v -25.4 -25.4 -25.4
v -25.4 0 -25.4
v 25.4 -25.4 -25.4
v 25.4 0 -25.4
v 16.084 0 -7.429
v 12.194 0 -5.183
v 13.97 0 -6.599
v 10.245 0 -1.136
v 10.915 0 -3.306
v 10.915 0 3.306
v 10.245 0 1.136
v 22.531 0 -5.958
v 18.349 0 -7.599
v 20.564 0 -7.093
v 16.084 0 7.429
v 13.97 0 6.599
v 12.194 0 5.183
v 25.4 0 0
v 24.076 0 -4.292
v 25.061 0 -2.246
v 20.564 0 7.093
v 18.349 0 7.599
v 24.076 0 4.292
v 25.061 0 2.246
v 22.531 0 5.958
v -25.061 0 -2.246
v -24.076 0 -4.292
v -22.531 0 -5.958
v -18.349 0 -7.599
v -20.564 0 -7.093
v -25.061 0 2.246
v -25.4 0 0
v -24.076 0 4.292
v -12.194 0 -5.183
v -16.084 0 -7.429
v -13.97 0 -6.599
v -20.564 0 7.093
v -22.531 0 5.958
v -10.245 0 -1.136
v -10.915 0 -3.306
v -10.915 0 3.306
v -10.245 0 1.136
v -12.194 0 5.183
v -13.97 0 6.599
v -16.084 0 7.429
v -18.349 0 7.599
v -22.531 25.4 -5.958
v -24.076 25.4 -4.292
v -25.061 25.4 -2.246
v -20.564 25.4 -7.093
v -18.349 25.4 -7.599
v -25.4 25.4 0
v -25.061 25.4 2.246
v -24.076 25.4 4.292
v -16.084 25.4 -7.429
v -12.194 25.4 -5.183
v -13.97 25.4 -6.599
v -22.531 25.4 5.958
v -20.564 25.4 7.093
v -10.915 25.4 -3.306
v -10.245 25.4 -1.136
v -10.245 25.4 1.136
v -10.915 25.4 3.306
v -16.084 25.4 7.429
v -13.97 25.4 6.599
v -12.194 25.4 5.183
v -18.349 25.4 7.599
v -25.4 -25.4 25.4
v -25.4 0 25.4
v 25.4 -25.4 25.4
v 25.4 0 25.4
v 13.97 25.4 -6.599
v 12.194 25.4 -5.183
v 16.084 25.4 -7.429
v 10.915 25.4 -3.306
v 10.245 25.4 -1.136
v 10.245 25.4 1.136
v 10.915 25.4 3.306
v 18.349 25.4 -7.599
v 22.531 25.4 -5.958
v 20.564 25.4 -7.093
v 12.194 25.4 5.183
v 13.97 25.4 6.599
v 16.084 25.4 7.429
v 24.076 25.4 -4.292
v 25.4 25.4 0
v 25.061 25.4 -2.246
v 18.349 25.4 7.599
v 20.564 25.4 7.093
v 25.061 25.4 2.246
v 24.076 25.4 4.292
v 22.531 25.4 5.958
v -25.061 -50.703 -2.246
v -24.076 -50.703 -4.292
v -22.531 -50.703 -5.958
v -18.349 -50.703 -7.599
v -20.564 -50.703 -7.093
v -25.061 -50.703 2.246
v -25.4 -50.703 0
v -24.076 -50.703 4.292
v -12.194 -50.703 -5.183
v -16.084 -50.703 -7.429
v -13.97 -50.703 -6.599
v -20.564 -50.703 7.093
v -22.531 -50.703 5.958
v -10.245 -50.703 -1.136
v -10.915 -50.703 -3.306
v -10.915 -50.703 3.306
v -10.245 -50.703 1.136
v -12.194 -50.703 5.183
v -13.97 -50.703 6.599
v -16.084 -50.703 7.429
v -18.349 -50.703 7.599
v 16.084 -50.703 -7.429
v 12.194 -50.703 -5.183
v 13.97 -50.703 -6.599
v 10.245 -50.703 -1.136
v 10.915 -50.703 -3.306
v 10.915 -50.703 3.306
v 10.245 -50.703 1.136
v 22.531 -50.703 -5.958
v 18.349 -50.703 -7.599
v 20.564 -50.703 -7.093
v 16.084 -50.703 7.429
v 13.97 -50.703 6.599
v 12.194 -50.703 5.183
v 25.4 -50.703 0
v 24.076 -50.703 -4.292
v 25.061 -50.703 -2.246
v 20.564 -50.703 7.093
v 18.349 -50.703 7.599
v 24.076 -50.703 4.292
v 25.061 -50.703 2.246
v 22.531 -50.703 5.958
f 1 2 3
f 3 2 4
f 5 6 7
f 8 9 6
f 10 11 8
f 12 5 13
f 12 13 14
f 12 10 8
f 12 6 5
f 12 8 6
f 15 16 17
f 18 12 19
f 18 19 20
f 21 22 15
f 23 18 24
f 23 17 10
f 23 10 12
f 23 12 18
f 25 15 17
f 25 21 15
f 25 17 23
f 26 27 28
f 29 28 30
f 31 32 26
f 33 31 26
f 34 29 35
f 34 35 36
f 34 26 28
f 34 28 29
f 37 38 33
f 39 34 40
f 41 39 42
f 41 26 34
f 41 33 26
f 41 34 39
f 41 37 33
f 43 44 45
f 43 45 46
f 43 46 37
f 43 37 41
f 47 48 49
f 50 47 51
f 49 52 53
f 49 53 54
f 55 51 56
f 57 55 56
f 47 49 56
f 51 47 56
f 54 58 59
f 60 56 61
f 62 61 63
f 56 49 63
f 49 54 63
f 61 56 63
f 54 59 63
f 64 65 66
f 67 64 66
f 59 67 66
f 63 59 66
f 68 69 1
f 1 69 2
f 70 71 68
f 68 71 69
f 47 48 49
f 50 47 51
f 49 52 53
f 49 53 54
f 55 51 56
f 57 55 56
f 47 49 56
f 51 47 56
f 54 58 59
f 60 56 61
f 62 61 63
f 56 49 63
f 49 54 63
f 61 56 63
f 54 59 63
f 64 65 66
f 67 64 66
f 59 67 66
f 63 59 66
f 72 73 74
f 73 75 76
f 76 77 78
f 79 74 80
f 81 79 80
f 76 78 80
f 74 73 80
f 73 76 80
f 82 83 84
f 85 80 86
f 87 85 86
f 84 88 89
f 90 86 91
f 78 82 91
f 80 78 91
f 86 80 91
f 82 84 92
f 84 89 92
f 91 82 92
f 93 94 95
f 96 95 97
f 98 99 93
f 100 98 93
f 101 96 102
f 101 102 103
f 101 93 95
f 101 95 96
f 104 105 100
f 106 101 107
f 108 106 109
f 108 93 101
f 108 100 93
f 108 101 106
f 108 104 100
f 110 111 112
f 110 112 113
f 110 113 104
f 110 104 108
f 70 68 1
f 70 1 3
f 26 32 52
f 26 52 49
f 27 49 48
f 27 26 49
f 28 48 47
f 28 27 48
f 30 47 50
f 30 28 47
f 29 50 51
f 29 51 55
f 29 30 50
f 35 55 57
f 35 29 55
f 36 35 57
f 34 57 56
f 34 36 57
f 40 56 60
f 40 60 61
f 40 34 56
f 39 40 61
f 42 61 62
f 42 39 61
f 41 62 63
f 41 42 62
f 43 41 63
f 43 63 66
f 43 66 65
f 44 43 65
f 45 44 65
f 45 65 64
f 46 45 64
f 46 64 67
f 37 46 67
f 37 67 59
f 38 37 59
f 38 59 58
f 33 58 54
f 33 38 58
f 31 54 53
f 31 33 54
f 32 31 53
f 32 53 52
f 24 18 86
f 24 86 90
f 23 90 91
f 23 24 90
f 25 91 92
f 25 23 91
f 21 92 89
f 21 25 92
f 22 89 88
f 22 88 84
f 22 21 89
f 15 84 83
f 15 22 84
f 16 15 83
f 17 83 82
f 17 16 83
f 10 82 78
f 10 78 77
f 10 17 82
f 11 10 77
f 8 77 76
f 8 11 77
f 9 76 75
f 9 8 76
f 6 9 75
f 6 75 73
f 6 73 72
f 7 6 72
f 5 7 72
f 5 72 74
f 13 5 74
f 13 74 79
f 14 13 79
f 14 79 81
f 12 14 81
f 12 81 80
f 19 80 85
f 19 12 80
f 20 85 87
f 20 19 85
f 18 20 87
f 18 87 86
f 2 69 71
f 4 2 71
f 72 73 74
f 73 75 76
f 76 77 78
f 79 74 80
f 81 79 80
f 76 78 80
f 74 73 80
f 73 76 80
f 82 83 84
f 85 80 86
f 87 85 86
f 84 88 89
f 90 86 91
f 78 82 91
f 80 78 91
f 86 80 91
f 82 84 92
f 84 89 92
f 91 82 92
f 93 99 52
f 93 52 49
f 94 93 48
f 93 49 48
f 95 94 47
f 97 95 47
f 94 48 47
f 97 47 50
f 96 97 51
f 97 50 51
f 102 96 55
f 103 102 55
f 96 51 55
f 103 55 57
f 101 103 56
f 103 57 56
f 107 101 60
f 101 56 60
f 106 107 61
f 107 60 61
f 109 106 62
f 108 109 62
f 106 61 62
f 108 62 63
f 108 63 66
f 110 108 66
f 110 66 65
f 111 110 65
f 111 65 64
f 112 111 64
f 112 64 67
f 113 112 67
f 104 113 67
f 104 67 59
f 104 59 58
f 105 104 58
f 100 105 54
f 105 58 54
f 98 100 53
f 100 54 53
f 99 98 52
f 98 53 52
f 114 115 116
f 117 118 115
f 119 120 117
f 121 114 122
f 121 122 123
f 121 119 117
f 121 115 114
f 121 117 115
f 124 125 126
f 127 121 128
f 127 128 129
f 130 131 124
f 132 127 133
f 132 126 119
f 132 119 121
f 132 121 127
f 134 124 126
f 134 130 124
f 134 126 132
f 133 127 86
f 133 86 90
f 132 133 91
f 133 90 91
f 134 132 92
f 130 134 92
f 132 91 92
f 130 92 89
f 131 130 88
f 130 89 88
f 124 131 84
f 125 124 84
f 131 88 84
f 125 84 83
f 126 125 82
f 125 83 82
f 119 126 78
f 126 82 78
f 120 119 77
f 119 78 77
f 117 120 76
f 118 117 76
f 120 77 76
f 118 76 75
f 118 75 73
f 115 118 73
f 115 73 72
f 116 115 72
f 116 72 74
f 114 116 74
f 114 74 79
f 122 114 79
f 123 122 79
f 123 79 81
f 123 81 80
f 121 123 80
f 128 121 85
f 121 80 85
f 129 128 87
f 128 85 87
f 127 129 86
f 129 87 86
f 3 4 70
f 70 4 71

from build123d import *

# Parameters (mm, degrees)
F0_R     = 7.62
F1_DEPTH = 25.4
F2_DEPTH = 25.4
F3_DEPTH = 76.1033371091


with BuildPart() as f1:
    # F0 (on Front) → F1 (new body)
    with BuildSketch(Plane.XZ):
        with Locations((17.78, 0)):
            Circle(F0_R)
    extrude(amount=-F1_DEPTH)


with BuildPart() as f1b:
    # F0 (on Front) → F1, piece 2 (new body)
    with BuildSketch(Plane.XZ):
        with BuildLine():
            ThreePointArc((-10.16, 0), (-17.78, 7.62), (-25.4, 0))
            ThreePointArc((-25.4, 0), (-17.78, -7.62), (-10.16, 0))
        make_face()
    extrude(amount=-F1_DEPTH)


with BuildPart() as f2:
    # F0 (on Front) → F2 (new body)
    with BuildSketch(Plane.XZ):
        Polygon((25.4, 25.4), (0, 25.4), (-25.4, 25.4), (-25.4, 0), (-25.4, -25.4), (0, -25.4), (25.4, -25.4), (25.4, 0), align=None)
        with BuildLine():
            ThreePointArc((-10.16, 0), (-17.78, -7.62), (-25.4, 0))
            ThreePointArc((-25.4, 0), (-17.78, 7.62), (-10.16, 0))
        make_face(mode=Mode.SUBTRACT)
        with Locations((17.78, 0)):
            Circle(F0_R, mode=Mode.SUBTRACT)
        with BuildLine():
            ThreePointArc((-10.16, 0), (-17.78, 7.62), (-25.4, 0))
            ThreePointArc((-25.4, 0), (-17.78, -7.62), (-10.16, 0))
        make_face()
        with Locations((17.78, 0)):
            Circle(F0_R)
    extrude(amount=F2_DEPTH)


with BuildPart() as f3:
    # F3 (new): a face of the model
    f3_faces = [f1.part.faces().sort_by_distance(p)[0] for p in [
        (17.78, 25.4, 0),
    ]]
    extrude(f3_faces, amount=-F3_DEPTH)


with BuildPart() as f3b:
    # F3#2 (new): a face of the model
    f3_2_faces = [f1b.part.faces().sort_by_distance(p)[0] for p in [
        (-17.78, 25.4, 0),
    ]]
    extrude(f3_2_faces, amount=-F3_DEPTH)


solid = Compound([f1.part, f1b.part, f2.part, f3.part, f3b.part])
